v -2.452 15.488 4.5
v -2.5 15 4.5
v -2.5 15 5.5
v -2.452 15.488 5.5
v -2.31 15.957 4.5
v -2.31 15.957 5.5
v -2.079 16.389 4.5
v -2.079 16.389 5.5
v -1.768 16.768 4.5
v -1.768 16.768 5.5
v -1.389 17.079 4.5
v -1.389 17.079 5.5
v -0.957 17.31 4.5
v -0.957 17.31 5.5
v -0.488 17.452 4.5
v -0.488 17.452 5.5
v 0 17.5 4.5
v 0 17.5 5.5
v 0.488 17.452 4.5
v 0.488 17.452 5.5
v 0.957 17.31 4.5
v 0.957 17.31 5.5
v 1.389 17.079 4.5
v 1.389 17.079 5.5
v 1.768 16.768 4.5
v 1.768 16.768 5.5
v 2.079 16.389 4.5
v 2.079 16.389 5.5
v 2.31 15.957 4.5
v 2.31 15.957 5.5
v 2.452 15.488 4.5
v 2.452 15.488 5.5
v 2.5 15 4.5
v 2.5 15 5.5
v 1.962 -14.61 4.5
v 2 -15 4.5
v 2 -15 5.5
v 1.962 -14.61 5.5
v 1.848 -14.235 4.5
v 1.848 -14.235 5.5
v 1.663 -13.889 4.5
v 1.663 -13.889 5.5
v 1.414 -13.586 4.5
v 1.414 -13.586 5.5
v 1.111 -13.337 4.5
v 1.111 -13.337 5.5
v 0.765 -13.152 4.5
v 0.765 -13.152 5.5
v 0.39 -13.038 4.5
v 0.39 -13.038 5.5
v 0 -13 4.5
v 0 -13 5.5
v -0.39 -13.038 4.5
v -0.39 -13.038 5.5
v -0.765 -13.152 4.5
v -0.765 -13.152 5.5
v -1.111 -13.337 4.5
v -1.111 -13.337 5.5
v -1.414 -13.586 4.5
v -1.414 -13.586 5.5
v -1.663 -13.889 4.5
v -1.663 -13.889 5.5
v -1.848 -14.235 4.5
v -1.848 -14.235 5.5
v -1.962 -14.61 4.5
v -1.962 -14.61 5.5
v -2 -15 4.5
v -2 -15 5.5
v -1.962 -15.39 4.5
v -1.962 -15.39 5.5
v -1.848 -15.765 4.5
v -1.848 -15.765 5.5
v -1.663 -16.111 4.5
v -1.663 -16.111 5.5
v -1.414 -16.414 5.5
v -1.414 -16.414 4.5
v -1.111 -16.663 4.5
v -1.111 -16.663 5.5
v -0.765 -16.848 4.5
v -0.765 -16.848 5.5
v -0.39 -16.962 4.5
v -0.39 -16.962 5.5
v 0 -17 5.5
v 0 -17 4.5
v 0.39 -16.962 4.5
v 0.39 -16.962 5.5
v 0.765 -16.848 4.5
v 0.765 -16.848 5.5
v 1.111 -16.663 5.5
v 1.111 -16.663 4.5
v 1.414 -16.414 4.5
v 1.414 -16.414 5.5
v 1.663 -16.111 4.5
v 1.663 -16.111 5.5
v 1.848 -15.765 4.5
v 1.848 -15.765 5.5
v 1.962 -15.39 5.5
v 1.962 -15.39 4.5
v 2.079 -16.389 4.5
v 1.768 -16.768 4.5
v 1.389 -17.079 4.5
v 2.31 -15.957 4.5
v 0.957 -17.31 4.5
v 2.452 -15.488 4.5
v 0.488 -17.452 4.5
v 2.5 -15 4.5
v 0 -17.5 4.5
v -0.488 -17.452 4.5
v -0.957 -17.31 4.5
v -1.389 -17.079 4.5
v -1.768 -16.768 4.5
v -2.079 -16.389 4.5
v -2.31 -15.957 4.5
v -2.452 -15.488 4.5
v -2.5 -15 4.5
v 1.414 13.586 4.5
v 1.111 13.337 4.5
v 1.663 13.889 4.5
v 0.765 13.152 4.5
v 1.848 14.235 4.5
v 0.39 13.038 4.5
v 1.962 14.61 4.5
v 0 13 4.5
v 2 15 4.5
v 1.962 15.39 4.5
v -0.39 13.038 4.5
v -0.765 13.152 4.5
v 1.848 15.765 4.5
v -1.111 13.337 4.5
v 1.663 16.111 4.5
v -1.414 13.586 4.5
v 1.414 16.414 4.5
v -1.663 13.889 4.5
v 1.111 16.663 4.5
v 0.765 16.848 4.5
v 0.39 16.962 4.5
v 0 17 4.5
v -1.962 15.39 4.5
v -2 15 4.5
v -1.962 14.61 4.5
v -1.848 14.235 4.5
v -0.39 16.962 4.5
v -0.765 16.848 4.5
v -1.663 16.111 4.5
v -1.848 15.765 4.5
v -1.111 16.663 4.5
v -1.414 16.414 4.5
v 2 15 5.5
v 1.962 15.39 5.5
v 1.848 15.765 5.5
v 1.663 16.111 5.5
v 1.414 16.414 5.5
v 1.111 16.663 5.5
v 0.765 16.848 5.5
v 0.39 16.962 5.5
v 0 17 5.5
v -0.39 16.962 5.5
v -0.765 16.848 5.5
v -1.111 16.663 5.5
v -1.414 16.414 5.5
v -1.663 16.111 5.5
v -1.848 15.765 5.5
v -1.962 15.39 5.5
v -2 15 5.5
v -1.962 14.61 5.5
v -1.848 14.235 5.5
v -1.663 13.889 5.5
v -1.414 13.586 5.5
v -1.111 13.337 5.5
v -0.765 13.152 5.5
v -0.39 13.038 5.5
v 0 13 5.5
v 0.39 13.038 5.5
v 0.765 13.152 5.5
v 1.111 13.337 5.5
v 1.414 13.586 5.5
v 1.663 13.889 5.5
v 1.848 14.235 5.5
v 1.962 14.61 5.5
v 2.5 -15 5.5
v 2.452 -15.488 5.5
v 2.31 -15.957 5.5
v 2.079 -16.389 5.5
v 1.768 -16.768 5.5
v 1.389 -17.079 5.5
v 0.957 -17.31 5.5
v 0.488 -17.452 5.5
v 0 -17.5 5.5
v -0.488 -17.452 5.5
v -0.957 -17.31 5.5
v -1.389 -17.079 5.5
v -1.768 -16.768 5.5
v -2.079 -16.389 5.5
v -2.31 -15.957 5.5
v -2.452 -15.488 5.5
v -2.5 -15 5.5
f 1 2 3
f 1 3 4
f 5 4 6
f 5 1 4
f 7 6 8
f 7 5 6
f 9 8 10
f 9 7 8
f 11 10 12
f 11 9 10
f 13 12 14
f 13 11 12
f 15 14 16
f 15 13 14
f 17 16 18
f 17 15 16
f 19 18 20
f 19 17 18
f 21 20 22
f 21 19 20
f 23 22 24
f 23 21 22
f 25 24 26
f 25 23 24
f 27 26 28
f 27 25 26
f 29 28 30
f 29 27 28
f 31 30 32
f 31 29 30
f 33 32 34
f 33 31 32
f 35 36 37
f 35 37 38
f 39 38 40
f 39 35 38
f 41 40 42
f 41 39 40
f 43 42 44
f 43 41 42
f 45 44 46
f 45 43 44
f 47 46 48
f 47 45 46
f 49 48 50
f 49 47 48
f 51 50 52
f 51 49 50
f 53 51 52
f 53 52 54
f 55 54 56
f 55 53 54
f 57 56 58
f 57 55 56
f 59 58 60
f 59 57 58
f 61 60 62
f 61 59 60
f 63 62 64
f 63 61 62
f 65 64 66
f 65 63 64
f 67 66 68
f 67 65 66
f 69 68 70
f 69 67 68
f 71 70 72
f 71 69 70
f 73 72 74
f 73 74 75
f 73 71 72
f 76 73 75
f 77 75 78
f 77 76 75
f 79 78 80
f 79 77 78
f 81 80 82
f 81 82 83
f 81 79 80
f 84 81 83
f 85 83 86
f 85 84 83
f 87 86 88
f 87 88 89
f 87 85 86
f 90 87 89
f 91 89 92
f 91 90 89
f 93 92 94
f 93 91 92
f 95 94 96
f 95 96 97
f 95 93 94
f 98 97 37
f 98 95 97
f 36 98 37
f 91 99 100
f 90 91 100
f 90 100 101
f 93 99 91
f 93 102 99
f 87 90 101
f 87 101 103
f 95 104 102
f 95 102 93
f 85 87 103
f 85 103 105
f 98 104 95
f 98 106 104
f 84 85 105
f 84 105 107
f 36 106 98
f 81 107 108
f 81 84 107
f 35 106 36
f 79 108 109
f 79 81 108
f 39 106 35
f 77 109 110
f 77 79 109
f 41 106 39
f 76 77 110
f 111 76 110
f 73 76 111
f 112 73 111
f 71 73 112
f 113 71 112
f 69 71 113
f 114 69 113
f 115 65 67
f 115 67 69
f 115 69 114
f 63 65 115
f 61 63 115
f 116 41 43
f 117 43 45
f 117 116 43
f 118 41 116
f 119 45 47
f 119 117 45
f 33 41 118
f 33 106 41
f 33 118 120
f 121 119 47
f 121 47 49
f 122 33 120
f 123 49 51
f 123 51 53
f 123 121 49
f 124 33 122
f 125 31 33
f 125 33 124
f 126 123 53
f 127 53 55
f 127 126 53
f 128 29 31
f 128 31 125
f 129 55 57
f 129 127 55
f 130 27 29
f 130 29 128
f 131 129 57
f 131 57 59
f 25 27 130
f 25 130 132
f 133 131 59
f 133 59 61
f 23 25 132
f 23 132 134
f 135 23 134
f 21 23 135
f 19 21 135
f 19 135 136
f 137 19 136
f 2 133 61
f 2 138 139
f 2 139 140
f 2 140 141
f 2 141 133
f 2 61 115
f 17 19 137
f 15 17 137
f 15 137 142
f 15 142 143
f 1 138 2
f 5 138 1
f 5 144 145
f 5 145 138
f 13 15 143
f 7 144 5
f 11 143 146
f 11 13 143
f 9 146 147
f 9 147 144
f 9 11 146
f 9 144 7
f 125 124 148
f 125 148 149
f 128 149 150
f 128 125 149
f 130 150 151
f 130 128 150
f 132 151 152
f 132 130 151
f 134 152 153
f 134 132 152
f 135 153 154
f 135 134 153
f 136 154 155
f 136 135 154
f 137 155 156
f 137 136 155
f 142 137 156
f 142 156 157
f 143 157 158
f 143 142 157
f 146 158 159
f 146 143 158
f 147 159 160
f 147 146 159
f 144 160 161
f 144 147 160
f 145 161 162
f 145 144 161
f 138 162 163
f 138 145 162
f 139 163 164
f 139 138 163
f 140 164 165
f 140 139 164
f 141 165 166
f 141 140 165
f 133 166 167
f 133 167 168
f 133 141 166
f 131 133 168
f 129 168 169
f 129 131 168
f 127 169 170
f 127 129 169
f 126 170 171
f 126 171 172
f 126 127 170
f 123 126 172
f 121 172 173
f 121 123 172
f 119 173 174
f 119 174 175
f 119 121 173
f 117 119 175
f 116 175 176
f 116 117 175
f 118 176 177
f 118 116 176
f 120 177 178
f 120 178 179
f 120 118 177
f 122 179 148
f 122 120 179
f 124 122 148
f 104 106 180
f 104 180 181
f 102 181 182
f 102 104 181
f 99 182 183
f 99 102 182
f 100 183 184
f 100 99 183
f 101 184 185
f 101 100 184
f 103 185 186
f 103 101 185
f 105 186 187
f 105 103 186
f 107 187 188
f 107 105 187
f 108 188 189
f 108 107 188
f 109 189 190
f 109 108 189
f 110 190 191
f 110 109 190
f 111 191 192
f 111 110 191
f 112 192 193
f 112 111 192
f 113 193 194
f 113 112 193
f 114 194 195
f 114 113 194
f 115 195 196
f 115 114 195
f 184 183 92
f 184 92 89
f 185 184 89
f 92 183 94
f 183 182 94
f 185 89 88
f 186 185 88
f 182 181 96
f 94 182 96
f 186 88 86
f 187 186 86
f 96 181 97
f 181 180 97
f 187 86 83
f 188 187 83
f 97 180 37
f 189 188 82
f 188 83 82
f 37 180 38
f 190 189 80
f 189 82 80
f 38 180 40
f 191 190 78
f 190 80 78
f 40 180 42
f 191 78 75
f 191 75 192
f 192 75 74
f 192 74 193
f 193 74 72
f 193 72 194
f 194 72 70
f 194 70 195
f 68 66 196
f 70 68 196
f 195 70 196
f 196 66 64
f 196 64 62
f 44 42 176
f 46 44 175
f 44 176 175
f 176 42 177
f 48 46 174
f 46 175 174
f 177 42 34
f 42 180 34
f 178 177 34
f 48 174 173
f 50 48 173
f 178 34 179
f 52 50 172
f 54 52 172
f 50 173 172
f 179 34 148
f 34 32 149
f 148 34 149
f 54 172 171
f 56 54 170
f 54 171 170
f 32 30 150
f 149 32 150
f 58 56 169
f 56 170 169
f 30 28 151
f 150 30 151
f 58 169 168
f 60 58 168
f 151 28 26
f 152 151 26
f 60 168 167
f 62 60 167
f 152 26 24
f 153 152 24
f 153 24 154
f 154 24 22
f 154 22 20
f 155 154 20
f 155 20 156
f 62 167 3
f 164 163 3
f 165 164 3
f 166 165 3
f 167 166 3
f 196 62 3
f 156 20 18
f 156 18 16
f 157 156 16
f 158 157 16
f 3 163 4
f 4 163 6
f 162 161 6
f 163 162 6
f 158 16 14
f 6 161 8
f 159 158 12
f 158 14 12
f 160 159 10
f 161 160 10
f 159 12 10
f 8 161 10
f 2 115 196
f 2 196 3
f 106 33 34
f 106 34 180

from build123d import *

# Parameters (mm, degrees)
SKETCH1_R           = 20
BOSS_EXTRUDE1_DEPTH = 10
SCALE2_SCALE        = 0.1


with BuildPart() as part:
    # Sketch1 → Boss-Extrude1 (new body)
    with BuildSketch(Plane.XY):
        with BuildLine():
            Line((-25, -150), (-25, 150))
            ThreePointArc((-25, 150), (0, 175), (25, 150))
            Line((25, 150), (25, -150))
            ThreePointArc((25, -150), (0, -175), (-25, -150))
        make_face()
        with Locations((0, 150)):
            Circle(SKETCH1_R, mode=Mode.SUBTRACT)
        with Locations((0, -150)):
            Circle(SKETCH1_R, mode=Mode.SUBTRACT)
    extrude(amount=BOSS_EXTRUDE1_DEPTH)


with BuildPart() as part_1:
    # Scale2: scaled about (0, 0, 5)
    add(part.part.scale(SCALE2_SCALE).moved(Location((0, 0, 4.5))))


solid = part_1.part
